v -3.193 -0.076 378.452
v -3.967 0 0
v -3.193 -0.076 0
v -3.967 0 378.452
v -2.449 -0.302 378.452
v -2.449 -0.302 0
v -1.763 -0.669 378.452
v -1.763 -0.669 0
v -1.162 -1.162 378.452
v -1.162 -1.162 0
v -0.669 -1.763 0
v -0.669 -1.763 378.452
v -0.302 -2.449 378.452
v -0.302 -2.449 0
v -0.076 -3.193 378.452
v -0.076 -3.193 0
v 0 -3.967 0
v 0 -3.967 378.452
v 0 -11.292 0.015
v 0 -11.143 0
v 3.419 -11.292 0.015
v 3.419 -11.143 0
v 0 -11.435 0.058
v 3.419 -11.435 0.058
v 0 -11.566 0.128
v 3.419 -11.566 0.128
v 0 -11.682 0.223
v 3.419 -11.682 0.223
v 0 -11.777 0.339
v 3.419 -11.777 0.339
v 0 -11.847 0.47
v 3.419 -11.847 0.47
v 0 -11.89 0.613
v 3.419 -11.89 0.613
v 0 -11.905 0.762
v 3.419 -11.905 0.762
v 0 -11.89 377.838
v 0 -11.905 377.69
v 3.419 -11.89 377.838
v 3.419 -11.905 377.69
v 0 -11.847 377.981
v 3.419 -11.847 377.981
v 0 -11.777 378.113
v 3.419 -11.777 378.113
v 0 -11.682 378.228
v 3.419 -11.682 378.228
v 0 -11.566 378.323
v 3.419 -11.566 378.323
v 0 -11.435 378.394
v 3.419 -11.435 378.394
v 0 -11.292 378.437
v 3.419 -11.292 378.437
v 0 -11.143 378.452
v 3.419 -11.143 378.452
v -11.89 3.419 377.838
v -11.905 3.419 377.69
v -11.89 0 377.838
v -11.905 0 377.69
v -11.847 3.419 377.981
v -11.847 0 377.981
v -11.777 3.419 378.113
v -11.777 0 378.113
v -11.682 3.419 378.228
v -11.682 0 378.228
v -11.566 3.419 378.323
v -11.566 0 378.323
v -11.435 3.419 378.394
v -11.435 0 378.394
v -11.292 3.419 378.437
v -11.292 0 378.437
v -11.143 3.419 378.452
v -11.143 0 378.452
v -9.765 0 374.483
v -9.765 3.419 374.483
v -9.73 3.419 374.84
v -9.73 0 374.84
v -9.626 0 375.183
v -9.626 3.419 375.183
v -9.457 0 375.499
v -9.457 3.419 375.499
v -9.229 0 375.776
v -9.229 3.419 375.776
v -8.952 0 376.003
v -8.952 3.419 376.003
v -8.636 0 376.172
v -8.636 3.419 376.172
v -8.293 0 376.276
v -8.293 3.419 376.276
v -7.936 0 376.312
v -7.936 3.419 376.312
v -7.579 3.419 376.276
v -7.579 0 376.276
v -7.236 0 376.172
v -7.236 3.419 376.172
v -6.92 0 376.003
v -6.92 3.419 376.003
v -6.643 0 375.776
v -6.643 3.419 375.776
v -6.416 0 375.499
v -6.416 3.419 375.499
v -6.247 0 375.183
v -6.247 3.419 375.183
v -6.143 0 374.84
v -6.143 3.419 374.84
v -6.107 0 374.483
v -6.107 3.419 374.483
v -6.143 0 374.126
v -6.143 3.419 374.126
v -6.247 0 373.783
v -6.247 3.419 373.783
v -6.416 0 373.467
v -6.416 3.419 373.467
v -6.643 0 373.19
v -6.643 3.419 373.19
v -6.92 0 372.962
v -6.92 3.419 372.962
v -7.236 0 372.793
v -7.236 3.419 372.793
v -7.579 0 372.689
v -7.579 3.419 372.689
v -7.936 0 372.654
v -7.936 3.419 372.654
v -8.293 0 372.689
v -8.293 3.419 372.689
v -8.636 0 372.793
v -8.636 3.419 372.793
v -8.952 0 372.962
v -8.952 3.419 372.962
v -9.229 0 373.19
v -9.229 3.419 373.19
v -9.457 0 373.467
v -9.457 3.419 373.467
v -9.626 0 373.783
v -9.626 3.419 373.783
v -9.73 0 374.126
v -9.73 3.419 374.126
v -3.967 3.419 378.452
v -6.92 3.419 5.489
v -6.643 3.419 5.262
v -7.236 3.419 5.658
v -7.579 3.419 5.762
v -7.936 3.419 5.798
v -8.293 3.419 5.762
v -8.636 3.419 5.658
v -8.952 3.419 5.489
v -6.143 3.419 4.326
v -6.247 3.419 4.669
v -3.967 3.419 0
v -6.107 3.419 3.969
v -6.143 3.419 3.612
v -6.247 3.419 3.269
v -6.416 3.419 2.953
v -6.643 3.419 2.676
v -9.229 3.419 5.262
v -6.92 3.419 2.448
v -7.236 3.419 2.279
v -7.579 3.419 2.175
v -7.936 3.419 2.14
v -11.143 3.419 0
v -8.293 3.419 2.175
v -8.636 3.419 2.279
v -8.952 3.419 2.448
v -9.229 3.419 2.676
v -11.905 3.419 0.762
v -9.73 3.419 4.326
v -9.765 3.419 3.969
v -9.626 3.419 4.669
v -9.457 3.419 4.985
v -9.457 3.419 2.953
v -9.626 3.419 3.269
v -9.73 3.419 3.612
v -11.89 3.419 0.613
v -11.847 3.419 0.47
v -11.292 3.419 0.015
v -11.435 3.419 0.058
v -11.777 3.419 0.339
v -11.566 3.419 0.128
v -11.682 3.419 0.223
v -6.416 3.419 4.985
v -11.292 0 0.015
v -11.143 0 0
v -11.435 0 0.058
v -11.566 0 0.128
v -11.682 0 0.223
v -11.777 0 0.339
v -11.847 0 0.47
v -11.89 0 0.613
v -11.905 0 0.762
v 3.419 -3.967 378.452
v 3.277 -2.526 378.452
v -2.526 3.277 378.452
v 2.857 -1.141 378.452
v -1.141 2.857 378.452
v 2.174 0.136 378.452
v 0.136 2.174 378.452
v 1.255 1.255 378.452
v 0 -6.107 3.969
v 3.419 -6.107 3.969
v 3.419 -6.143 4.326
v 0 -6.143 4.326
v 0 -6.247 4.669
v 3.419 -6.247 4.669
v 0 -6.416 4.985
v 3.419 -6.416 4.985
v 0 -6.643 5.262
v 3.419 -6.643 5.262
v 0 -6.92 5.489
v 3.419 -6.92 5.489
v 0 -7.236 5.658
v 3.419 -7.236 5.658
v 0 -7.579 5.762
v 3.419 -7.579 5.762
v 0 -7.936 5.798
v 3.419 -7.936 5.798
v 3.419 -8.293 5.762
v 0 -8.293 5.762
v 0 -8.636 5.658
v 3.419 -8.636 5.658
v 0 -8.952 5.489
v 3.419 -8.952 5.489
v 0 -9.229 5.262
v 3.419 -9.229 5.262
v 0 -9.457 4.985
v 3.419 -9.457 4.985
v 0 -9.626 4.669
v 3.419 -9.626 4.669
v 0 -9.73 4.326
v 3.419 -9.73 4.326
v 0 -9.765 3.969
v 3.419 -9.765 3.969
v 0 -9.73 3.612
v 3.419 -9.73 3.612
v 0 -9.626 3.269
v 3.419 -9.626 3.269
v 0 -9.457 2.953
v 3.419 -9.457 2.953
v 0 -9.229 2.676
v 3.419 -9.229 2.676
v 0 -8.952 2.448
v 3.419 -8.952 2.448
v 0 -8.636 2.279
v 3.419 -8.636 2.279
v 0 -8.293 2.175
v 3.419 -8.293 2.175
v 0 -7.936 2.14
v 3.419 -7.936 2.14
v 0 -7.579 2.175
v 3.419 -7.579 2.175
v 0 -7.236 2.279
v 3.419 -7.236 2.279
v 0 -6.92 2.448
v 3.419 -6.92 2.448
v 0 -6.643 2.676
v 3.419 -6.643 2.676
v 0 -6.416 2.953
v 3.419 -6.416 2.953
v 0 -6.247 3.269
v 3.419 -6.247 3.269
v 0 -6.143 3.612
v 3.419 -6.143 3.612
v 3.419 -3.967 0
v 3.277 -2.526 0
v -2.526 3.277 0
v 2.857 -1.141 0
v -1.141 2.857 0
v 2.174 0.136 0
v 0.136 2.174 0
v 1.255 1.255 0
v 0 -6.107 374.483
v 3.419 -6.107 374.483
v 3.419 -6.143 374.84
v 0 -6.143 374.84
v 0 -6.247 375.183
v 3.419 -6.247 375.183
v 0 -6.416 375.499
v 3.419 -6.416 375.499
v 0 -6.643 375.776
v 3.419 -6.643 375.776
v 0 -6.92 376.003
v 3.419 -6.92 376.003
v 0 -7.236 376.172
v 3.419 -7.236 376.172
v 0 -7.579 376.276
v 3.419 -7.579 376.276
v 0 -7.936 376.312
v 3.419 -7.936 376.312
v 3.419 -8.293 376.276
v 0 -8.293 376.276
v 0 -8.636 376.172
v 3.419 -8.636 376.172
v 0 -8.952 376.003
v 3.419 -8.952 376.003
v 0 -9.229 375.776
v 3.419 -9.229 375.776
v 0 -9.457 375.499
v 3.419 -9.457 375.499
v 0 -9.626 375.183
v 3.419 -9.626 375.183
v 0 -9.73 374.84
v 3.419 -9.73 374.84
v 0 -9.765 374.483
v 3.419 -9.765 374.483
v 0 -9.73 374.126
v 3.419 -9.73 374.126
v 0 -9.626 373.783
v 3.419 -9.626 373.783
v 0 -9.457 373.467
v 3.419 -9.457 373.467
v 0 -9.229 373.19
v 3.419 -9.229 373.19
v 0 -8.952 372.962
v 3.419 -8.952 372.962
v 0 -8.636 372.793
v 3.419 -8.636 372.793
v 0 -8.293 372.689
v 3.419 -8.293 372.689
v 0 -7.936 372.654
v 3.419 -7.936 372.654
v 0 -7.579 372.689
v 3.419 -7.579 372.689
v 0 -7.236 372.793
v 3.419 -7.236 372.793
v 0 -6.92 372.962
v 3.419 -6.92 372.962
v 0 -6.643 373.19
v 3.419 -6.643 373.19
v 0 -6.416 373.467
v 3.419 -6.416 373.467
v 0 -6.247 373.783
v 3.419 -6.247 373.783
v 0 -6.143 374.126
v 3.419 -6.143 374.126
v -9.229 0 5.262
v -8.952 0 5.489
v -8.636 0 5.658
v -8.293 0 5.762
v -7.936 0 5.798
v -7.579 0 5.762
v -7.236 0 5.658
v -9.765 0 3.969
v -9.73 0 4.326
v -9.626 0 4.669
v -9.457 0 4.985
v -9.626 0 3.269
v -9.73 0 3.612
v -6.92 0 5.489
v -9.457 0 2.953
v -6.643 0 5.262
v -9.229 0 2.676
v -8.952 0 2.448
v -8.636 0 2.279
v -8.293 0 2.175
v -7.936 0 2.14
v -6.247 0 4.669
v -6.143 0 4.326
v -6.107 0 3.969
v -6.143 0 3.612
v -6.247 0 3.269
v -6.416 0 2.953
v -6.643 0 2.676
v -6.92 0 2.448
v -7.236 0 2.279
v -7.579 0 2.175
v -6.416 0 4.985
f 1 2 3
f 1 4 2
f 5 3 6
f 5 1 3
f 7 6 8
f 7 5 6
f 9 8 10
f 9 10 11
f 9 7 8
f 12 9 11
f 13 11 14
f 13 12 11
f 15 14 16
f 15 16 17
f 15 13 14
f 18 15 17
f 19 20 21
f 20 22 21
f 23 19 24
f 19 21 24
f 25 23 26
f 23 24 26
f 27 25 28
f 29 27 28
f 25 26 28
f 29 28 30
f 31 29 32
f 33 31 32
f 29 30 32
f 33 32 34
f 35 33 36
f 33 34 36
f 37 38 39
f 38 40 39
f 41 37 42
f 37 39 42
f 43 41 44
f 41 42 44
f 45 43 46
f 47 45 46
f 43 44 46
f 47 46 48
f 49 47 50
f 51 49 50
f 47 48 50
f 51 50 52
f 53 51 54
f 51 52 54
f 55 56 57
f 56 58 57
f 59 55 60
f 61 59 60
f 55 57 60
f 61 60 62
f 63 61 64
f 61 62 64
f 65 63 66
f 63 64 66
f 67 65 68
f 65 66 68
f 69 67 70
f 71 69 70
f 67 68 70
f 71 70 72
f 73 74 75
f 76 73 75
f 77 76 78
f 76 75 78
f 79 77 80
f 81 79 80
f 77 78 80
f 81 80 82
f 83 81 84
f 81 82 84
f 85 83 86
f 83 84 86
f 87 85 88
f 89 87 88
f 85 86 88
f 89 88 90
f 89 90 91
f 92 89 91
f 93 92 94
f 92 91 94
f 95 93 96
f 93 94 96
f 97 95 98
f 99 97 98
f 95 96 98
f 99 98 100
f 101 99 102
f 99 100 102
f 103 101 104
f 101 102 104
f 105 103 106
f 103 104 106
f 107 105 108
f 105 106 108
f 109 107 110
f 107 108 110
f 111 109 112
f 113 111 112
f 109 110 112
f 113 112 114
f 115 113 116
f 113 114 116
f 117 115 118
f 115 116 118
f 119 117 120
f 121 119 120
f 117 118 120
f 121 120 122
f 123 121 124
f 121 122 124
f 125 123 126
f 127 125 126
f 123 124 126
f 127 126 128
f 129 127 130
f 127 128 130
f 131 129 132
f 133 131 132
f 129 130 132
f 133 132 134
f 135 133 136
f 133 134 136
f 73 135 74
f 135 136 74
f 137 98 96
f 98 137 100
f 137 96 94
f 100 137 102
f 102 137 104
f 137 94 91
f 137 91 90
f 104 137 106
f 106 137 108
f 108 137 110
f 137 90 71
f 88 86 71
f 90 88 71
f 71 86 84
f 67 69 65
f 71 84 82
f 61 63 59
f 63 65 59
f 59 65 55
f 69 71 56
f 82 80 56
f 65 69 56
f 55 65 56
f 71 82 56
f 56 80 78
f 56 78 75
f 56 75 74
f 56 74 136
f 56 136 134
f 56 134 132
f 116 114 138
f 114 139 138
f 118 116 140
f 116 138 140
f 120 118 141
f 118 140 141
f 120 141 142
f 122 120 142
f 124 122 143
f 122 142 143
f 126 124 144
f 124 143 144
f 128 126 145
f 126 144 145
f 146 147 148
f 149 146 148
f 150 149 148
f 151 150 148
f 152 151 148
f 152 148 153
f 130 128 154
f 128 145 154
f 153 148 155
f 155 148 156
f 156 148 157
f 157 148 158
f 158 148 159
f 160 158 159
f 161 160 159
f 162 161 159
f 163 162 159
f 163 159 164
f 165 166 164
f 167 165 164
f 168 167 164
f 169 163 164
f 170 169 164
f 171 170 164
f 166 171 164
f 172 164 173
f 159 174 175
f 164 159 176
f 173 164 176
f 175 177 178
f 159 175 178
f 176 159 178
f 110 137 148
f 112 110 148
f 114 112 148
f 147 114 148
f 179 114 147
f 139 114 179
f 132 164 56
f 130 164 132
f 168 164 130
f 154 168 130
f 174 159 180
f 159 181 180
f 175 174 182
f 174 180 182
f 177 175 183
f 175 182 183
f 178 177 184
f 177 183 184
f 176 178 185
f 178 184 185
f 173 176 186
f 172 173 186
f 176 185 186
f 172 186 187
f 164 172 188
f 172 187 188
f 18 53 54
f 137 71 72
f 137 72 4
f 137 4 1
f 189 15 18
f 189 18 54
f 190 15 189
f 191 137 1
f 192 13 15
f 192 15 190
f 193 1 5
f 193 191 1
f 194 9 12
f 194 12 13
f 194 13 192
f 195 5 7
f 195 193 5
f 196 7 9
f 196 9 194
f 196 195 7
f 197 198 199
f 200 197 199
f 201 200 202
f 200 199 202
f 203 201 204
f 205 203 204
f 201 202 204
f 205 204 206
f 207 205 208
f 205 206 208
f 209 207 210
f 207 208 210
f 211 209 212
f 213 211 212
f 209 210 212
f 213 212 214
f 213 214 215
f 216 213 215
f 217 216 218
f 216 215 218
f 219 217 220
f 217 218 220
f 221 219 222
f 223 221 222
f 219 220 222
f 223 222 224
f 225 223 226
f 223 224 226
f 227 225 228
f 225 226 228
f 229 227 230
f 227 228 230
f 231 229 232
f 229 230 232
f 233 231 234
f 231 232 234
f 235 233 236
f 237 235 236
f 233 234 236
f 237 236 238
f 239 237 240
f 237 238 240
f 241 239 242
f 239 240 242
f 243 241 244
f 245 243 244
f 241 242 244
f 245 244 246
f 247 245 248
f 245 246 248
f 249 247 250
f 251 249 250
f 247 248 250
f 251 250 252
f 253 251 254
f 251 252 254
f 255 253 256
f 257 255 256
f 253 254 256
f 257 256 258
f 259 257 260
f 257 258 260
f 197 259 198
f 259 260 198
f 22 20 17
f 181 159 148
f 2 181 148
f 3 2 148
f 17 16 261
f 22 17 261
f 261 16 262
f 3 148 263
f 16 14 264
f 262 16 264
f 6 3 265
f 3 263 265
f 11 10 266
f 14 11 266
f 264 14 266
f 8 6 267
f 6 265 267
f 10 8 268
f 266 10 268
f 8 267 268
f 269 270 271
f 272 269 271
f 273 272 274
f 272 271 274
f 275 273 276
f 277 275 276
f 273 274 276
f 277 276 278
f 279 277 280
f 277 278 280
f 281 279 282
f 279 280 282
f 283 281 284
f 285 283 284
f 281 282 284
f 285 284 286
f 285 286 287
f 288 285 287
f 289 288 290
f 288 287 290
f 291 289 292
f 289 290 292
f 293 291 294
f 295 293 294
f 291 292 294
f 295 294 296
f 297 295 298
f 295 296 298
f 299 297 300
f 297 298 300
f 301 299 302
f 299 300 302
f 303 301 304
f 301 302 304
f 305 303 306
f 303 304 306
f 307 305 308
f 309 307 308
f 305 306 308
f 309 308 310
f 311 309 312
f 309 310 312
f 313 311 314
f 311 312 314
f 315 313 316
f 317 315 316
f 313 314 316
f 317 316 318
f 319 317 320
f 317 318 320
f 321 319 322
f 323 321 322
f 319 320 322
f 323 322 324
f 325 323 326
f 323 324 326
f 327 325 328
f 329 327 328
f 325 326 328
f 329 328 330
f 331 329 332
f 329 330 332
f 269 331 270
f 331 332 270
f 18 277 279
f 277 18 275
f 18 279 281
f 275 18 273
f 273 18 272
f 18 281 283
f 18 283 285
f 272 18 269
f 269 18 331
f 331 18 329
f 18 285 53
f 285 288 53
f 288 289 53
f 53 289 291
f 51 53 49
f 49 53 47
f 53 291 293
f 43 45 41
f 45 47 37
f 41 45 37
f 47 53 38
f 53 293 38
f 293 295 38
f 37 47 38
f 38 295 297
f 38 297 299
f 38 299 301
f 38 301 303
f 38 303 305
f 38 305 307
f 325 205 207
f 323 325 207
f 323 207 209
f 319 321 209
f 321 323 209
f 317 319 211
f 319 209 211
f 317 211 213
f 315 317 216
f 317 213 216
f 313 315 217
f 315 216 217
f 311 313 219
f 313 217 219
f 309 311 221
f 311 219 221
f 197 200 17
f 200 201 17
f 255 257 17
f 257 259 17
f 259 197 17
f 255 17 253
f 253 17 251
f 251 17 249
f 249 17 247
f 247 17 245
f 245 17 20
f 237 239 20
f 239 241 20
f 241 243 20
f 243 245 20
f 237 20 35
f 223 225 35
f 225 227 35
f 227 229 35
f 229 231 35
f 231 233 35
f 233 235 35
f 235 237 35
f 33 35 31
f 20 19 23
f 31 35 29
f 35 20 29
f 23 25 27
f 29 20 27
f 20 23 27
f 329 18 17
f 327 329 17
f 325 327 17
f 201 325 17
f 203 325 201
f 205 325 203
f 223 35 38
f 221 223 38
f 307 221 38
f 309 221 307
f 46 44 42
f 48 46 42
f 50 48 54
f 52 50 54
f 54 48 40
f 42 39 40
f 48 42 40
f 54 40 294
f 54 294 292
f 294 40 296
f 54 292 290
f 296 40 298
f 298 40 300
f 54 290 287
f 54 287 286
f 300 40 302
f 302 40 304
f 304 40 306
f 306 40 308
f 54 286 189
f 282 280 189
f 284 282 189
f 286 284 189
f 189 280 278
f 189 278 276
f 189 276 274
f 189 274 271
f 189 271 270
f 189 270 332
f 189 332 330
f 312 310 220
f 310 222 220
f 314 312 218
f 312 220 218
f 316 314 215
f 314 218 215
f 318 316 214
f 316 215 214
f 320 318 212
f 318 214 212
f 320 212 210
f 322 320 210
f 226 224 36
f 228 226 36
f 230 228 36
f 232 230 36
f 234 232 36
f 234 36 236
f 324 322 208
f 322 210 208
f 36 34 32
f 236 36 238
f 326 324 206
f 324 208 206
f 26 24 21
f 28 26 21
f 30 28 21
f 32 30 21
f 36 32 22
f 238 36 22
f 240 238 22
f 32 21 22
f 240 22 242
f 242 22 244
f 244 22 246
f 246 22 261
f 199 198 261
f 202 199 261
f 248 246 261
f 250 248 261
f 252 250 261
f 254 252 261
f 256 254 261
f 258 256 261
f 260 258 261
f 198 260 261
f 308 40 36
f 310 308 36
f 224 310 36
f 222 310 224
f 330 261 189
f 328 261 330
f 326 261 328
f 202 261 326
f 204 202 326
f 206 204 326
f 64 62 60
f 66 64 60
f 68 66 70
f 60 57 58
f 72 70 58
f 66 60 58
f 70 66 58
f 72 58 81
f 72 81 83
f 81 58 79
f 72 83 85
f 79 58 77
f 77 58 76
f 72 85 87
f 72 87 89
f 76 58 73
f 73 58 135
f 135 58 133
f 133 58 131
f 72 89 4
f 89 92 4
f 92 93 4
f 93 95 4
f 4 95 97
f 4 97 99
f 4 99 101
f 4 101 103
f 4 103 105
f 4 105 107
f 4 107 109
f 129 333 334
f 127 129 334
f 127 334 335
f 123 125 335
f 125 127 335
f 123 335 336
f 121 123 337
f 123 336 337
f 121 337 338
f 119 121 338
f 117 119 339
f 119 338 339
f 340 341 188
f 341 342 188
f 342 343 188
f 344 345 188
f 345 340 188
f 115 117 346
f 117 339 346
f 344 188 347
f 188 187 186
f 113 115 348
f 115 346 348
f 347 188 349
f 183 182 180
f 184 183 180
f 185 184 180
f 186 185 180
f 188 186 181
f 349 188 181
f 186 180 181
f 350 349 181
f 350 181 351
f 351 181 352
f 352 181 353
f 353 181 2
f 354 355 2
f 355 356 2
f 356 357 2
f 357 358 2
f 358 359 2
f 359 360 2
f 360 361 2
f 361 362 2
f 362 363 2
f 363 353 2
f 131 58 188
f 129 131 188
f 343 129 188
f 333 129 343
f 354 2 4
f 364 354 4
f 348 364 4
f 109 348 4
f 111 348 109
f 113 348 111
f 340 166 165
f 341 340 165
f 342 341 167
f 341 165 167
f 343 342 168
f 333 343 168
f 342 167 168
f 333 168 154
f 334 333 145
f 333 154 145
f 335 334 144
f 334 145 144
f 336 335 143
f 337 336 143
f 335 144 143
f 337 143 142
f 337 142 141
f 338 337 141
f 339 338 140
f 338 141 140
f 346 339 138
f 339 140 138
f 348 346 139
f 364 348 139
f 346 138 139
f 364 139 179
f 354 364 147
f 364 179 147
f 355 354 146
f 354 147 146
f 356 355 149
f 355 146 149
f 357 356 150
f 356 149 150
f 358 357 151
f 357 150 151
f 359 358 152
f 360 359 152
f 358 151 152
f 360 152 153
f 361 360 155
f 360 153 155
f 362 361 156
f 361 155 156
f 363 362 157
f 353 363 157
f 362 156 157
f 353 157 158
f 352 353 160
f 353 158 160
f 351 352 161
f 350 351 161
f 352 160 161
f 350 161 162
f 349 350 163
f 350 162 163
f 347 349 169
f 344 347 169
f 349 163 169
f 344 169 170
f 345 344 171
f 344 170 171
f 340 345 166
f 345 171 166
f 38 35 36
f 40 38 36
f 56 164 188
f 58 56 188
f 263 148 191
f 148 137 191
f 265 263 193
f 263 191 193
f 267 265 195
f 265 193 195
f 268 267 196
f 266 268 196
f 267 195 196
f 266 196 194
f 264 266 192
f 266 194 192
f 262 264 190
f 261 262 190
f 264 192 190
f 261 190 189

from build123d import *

# Parameters (mm, degrees)
F1_DEPTH = 378.451567
F2_R     = 3.96748
F3_R     = 7.38632
F4_R     = 1.8288
F5_DEPTH = 3.41884
F6_R     = 1.8288
F7_DEPTH = 3.41884
F8_R     = 0.762


with BuildPart() as f1:
    # F0 (on Top) → F1 (new body)
    with BuildSketch(Plane.XY):
        Polygon((-11.90498, 0), (0, 0), (0, -11.90498), (3.41884, -11.90498), (3.41884, 3.41884), (-11.90498, 3.41884), align=None)
    extrude(amount=F1_DEPTH)

    # F2
    f2_edges = [f1.edges().sort_by_distance(p)[0] for p in [
        (0, 0, 189.225784),
    ]]
    fillet(f2_edges, radius=F2_R)

    # F3
    f3_edges = [f1.edges().sort_by_distance(p)[0] for p in [
        (3.41884, 3.41884, 189.225784),
    ]]
    fillet(f3_edges, radius=F3_R)

    # F4 (on face) → F5 (cut, through all)
    with BuildSketch(Plane(origin=(0, 3.41884, 0), x_dir=(-1, 0, 0), z_dir=(0, 1, 0))):
        with Locations((7.93623, 3.96875)):
            Circle(F4_R)
        with Locations((7.93623, 374.482817)):
            Circle(F4_R)
    extrude(amount=-F5_DEPTH, mode=Mode.SUBTRACT)

    # F6 (on face) → F7 (cut, through all)
    with BuildSketch(Plane.YZ.offset(3.41884)):
        with Locations((-7.93623, 374.482817)):
            Circle(F6_R)
        with Locations((-7.93623, 3.96875)):
            Circle(F6_R)
    extrude(amount=-F7_DEPTH, mode=Mode.SUBTRACT)

    # F8
    f8_edges = [f1.edges().sort_by_distance(p)[0] for p in [
        (-11.90498, 1.70942, 378.451567),
        (1.70942, -11.90498, 378.451567),
        (1.70942, -11.90498, 0),
        (-11.90498, 1.70942, 0),
    ]]
    fillet(f8_edges, radius=F8_R)


solid = f1.part
